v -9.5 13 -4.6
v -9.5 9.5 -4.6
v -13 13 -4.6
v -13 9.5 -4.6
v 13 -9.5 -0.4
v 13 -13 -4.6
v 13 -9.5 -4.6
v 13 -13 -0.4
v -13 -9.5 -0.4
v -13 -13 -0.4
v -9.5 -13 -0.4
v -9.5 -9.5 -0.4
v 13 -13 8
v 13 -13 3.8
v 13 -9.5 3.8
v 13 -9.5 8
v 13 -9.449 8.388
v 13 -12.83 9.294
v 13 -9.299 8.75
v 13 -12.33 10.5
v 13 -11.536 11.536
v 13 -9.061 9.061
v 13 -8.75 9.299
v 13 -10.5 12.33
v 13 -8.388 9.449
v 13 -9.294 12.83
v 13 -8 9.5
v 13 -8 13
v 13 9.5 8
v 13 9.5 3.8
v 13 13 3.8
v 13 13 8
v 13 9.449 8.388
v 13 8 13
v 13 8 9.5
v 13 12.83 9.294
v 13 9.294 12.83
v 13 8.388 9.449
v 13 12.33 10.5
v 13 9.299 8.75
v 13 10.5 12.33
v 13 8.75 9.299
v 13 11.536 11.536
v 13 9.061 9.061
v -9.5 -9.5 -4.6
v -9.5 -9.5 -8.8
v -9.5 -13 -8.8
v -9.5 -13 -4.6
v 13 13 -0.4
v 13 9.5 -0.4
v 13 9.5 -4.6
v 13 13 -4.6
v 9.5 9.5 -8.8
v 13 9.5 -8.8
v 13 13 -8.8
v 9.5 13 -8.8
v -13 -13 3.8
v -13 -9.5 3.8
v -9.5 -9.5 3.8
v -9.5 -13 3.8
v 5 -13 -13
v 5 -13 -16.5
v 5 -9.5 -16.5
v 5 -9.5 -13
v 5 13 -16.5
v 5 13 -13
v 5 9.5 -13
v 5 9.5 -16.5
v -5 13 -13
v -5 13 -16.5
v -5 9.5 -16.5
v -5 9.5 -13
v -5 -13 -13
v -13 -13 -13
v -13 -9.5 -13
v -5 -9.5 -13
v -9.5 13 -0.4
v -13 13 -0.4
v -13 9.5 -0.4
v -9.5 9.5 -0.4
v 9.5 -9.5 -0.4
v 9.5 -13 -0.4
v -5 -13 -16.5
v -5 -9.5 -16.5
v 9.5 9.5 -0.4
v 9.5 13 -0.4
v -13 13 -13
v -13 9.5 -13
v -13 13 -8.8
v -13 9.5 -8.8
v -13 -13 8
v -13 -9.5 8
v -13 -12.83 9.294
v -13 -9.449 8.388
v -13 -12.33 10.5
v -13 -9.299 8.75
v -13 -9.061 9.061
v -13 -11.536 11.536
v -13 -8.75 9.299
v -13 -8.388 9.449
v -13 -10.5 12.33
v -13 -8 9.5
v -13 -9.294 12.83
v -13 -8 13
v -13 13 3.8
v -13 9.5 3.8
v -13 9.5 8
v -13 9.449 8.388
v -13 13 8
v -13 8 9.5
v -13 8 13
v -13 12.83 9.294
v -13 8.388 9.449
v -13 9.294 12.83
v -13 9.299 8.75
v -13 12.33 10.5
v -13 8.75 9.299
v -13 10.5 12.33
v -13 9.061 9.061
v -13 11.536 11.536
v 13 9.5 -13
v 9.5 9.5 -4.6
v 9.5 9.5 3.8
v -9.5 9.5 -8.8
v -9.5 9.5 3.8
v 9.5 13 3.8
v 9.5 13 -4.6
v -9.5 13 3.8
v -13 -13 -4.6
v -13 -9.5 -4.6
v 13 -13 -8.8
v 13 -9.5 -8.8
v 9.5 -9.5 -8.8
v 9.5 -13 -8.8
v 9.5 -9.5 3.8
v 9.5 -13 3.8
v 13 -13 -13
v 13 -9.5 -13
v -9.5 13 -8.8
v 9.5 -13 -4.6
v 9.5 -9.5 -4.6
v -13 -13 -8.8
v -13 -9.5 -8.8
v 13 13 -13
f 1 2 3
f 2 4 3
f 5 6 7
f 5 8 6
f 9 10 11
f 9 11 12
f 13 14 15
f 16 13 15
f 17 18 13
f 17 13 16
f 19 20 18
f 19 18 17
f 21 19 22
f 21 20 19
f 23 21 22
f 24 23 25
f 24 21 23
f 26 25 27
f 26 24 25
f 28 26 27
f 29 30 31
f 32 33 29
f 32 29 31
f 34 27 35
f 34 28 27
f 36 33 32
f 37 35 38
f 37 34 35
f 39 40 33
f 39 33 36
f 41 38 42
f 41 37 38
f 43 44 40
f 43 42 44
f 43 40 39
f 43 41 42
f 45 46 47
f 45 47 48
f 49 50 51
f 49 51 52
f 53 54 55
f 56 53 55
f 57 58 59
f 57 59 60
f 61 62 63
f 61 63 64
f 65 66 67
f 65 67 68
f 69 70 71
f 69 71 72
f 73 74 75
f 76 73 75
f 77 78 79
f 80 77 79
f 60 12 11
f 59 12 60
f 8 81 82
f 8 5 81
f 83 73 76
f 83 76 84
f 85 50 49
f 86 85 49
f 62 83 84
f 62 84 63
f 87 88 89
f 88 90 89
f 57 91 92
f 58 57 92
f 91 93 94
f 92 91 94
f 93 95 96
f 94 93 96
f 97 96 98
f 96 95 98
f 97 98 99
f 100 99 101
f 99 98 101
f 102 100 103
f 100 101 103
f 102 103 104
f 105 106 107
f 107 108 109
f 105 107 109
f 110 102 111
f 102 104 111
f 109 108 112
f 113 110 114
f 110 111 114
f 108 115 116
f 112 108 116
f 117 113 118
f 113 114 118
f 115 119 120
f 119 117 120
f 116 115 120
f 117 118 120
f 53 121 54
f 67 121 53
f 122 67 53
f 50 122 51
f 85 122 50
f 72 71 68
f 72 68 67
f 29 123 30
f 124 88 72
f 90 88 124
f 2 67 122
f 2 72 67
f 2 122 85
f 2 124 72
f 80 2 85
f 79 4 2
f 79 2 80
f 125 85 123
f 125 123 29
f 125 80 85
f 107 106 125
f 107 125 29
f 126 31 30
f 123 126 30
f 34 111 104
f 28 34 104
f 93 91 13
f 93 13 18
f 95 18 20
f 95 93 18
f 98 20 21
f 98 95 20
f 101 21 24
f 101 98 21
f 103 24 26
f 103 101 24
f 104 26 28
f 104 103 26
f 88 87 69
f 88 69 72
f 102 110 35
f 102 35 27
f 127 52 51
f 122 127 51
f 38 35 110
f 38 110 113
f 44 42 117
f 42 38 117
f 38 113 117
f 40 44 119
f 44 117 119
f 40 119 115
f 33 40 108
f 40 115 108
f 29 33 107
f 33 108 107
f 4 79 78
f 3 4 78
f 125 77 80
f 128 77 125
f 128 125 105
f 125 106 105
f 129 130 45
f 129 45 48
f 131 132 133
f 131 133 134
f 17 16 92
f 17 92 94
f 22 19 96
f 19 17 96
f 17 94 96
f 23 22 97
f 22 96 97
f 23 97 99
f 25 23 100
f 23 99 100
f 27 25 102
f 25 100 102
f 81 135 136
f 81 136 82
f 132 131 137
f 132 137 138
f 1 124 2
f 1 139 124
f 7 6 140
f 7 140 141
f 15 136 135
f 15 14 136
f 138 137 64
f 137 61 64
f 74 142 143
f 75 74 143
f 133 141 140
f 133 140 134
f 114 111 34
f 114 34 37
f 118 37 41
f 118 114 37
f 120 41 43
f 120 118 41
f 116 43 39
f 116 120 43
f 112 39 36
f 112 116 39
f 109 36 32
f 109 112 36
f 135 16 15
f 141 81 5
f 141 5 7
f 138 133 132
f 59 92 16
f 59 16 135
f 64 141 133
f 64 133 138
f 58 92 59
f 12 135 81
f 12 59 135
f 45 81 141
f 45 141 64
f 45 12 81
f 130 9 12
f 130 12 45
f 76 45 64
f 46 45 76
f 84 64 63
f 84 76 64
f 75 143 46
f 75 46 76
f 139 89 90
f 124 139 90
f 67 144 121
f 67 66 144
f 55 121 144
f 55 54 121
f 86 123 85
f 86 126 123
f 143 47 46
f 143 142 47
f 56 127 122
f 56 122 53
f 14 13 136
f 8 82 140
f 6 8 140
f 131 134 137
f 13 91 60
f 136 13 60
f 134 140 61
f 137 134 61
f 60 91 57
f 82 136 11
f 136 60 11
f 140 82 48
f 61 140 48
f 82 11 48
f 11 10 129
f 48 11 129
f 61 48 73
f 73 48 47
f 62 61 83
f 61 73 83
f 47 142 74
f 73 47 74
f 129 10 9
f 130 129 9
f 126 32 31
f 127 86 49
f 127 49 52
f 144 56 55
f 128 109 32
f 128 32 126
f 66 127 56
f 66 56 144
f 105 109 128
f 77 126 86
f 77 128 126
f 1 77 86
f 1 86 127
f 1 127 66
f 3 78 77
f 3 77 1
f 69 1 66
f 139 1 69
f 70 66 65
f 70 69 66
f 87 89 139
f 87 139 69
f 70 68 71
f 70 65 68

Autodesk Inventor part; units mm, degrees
ref_plane "YZ Plane" through (0, 0, 0) normal (1, 0, 0) x (0, 1, 0)
ref_plane "XZ Plane" through (0, 0, 0) normal (0, 1, 0) x (-1, 0, 0)
sketch "Sketch1" plane through (0, 0, 0) normal (1, 0, 0) x (0, 1, 0)
  line L0 (13, 8) -> (13, -13)
  line L1 (5, -13) -> (0, -13)
  line L2 (0, -16.5) -> (5, -16.5)
  line L3 (5, -16.5) -> (5, -13)
  line L4 (0, 7.0803) -> (-6.4131, 0.6672)
  line L5 (-7.0965, 1.3506) -> (-0.3417, 8.1054)
  line L6 (-7.9849, 0.4622) -> (-7.0965, 1.3506) construction
  spline S0 degree 3 poles (-8.4777, -1.9692) (-8.4777, -0.714) (-7.9849, 0.4622) (-7.0965, 1.3506) knots 7 7 7 7 8 8 8 8
  line L7 (-8.4777, -1.9692) -> (-8.4777, -0.714) construction
  line L8 (-8.4777, -0.714) -> (-7.9849, 0.4622) construction
  line L9 (-6.4131, 0.6672) -> (-7.1181, -0.0378) construction
  spline S1 degree 3 poles (-6.4131, 0.6672) (-7.1181, -0.0378) (-7.5065, -0.9729) (-7.5065, -1.9692) (-7.5065, -2.9656) (-7.1217, -3.9007) (-6.4167, -4.6021) knots 2 2 2 2 3 3 3 4 4 4 4
  line L10 (-7.1181, -0.0378) -> (-7.5065, -0.9729) construction
  line L11 (-7.5065, -0.9729) -> (-7.5065, -1.9692) construction
  line L12 (-7.5065, -1.9692) -> (-7.5065, -2.9656) construction
  line L13 (-7.5065, -2.9656) -> (-7.1217, -3.9007) construction
  line L14 (-7.1217, -3.9007) -> (-6.4167, -4.6021) construction
  line L15 (-8.4813, -3.2245) -> (-8.4777, -1.9692) construction
  spline S2 degree 3 poles (-7.1037, -5.2927) (-7.9921, -4.4043) (-8.4813, -3.2245) (-8.4777, -1.9692) knots 6 6 6 6 7 7 7 7
  line L16 (-7.1037, -5.2927) -> (-7.9921, -4.4043) construction
  line L17 (-7.9921, -4.4043) -> (-8.4813, -3.2245) construction
  line L18 (-1.1474, -4.5985) -> (-0.3345, -3.7856)
  line L19 (-1.8524, -5.3035) -> (-1.1474, -4.5985) construction
  spline S3 degree 3 poles (-6.4167, -4.6021) (-5.7153, -5.3035) (-4.7802, -5.6919) (-3.7874, -5.6919) (-2.7911, -5.6919) (-1.8524, -5.3035) (-1.1474, -4.5985) knots 4 4 4 4 5 5 5 6 6 6 6
  line L20 (-6.4167, -4.6021) -> (-5.7153, -5.3035) construction
  line L21 (-5.7153, -5.3035) -> (-4.7802, -5.6919) construction
  line L22 (-4.7802, -5.6919) -> (-3.7874, -5.6919) construction
  line L23 (-3.7874, -5.6919) -> (-2.7911, -5.6919) construction
  line L24 (-2.7911, -5.6919) -> (-1.8524, -5.3035) construction
  line L25 (-0.4604, -5.2855) -> (-1.3488, -6.1739) construction
  spline S4 degree 3 poles (-0.4604, -5.2855) (-1.3488, -6.1739) (-2.5321, -6.6667) (-3.7874, -6.6667) (-5.0391, -6.6667) (-6.2189, -6.1775) (-7.1037, -5.2927) knots 4 4 4 4 5 5 5 6 6 6 6
  line L26 (-1.3488, -6.1739) -> (-2.5321, -6.6667) construction
  line L27 (-2.5321, -6.6667) -> (-3.7874, -6.6667) construction
  line L28 (-3.7874, -6.6667) -> (-5.0391, -6.6667) construction
  line L29 (-5.0391, -6.6667) -> (-6.2189, -6.1775) construction
  line L30 (-6.2189, -6.1775) -> (-7.1037, -5.2927) construction
  line L31 (2.5429, -6.6559) -> (1.3632, -6.1667) construction
  spline S5 degree 3 poles (7.1181, -5.2819) (6.2297, -6.1703) (5.0535, -6.6559) (3.7982, -6.6559) (2.5429, -6.6559) (1.3632, -6.1667) (0.4748, -5.2783) knots 0 0 0 0 1 1 1 2 2 2 2
  line L32 (7.1181, -5.2819) -> (6.2297, -6.1703) construction
  line L33 (6.2297, -6.1703) -> (5.0535, -6.6559) construction
  line L34 (5.0535, -6.6559) -> (3.7982, -6.6559) construction
  line L35 (3.7982, -6.6559) -> (2.5429, -6.6559) construction
  line L36 (1.3632, -6.1667) -> (0.4748, -5.2783) construction
  spline S6 degree 3 poles (-0.3345, -3.7856) (-0.1439, -3.595) (0.1619, -3.595) (0.3525, -3.7856) knots 7 7 7 7 8 8 8 8
  line L37 (-0.1439, -3.595) -> (0.1619, -3.595) construction
  line L38 (-0.3345, -3.7856) -> (-0.1439, -3.595) construction
  line L39 (0.1619, -3.595) -> (0.3525, -3.7856) construction
  line L40 (0.0108, -4.8143) -> (-0.4604, -5.2855)
  line L41 (0.4748, -5.2783) -> (0.0108, -4.8143)
  line L42 (6.4275, 0.678) -> (0, 7.0803)
  line L43 (-0.3417, 8.1054) -> (-0.2482, 8.1989) construction
  spline S7 degree 3 poles (-0.3417, 8.1054) (-0.2482, 8.1989) (-0.1223, 8.2493) (0, 8.2493) (0.1223, 8.2493) (0.2482, 8.2025) (0.3417, 8.109) knots 9 9 9 9 10 10 10 11 11 11 11
  line L44 (-0.2482, 8.1989) -> (-0.1223, 8.2493) construction
  line L45 (-0.1223, 8.2493) -> (0, 8.2493) construction
  line L46 (0, 8.2493) -> (0.1223, 8.2493) construction
  line L47 (0.1223, 8.2493) -> (0.2482, 8.2025) construction
  line L48 (0.2482, 8.2025) -> (0.3417, 8.109) construction
  line L49 (0.3417, 8.109) -> (7.1109, 1.365)
  line L50 (0.3525, -3.7856) -> (1.1582, -4.5913)
  spline S8 degree 3 poles (1.1582, -4.5913) (1.8631, -5.2963) (2.8019, -5.6847) (3.7946, -5.6847) (4.7873, -5.6847) (5.7225, -5.2963) (6.4275, -4.5949) knots 9 9 9 9 10 10 10 11 11 11 11
  line L51 (1.1582, -4.5913) -> (1.8631, -5.2963) construction
  line L52 (1.8631, -5.2963) -> (2.8019, -5.6847) construction
  line L53 (2.8019, -5.6847) -> (3.7946, -5.6847) construction
  line L54 (3.7946, -5.6847) -> (4.7873, -5.6847) construction
  line L55 (4.7873, -5.6847) -> (5.7225, -5.2963) construction
  line L56 (5.7225, -5.2963) -> (6.4275, -4.5949) construction
  line L57 (6.4275, -4.5949) -> (7.1325, -3.8899) construction
  spline S9 degree 3 poles (6.4275, -4.5949) (7.1325, -3.8899) (7.5173, -2.9548) (7.5173, -1.9584) knots 11 11 11 11 12 12 12 12
  line L58 (7.1325, -3.8899) -> (7.5173, -2.9548) construction
  line L59 (7.5173, -2.9548) -> (7.5173, -1.9584) construction
  line L60 (8.0065, -4.3935) -> (7.1181, -5.2819) construction
  spline S10 degree 3 poles (8.4885, -1.9584) (8.4921, -3.2137) (8.0065, -4.3935) (7.1181, -5.2819) knots 13 13 13 13 14 14 14 14
  line L61 (8.4885, -1.9584) -> (8.4921, -3.2137) construction
  line L62 (8.4921, -3.2137) -> (8.0065, -4.3935) construction
  line L63 (7.5173, -1.9584) -> (7.5209, -0.9621) construction
  spline S11 degree 3 poles (7.5173, -1.9584) (7.5209, -0.9621) (7.1325, -0.027) (6.4275, 0.678) knots 12 12 12 12 13 13 13 13
  line L64 (7.5209, -0.9621) -> (7.1325, -0.027) construction
  line L65 (7.1325, -0.027) -> (6.4275, 0.678) construction
  line L66 (8.4885, -0.7032) -> (8.4885, -1.9584) construction
  spline S12 degree 3 poles (7.1109, 1.365) (7.9993, 0.4766) (8.4885, -0.7032) (8.4885, -1.9584) knots 12 12 12 12 13 13 13 13
  line L67 (7.1109, 1.365) -> (7.9993, 0.4766) construction
  line L68 (7.9993, 0.4766) -> (8.4885, -0.7032) construction
  arc A0 (13, 8) -> (8, 13) centre (8, 8) ccw
  line L69 (0, -16.5) -> (0, -13)
  line L70 (13, -13) -> (0, -13)
  line L71 (8, 13) -> (0, 13)
  line L72 (-8, 13) -> (0, 13)
  arc A1 (-8, 13) -> (-13, 8) centre (-8, 8) ccw
  line L73 (-5, -13) -> (0, -13)
  line L74 (-5, -16.5) -> (-5, -13)
  line L75 (0, -16.5) -> (-5, -16.5)
  line L76 (-13, -13) -> (0, -13)
  line L77 (-13, 8) -> (-13, -13)
  line L78 (13, -4.6) -> (16.5, -4.6)
  line L79 (16.5, -4.6) -> (16.5, -8.8)
  line L80 (16.5, -8.8) -> (13, -8.8)
  line L81 (13, -8.8) -> (13, -4.6)
  line L82 (16.5, -0.4) -> (13, -0.4)
  line L83 (16.5, 3.8) -> (16.5, -0.4)
  line L84 (13, 3.8) -> (16.5, 3.8)
  line L85 (-16.5, 3.8) -> (-16.5, -0.4)
  line L86 (-13, 3.8) -> (-16.5, 3.8)
  line L87 (-16.5, -0.4) -> (-13, -0.4)
  line L88 (-13, -4.6) -> (-16.5, -4.6)
  line L89 (-16.5, -8.8) -> (-13, -8.8)
  line L90 (-16.5, -4.6) -> (-16.5, -8.8)
  line L91 (9.5, -9.5) -> (9.5, 8)
  arc A2 (9.5, 8) -> (8, 9.5) centre (8, 8) ccw
  line L92 (8, 9.5) -> (0, 9.5)
  line L93 (0, 9.5) -> (-8, 9.5)
  arc A3 (-8, 9.5) -> (-9.5, 8) centre (-8, 8) ccw
  line L94 (-9.5, 8) -> (-9.5, -9.5)
  line L95 (-9.5, -9.5) -> (0, -9.5)
  line L96 (0, -9.5) -> (9.5, -9.5)
  line L97 (9.5, -9.5) -> (9.5, -13)
  line L98 (-9.5, -9.5) -> (-9.5, -13)
  line L99 (13, -8.8) -> (9.5, -8.8)
  line L100 (9.5, -8.8) -> (9.5, -4.6)
  line L101 (9.5, -4.6) -> (13, -4.6)
  line L102 (13, -4.6) -> (13, -8.8)
  line L103 (13, -0.4) -> (9.5, -0.4)
  line L104 (9.5, -0.4) -> (9.5, 3.8)
  line L105 (9.5, 3.8) -> (13, 3.8)
  line L106 (13, 3.8) -> (13, -0.4)
  line L107 (-13, 3.8) -> (-9.5, 3.8)
  line L108 (-9.5, 3.8) -> (-9.5, -0.4)
  line L109 (-9.5, -0.4) -> (-13, -0.4)
  line L110 (-13, -0.4) -> (-13, 3.8)
  line L111 (-13, -4.6) -> (-9.5, -4.6)
  line L112 (-9.5, -4.6) -> (-9.5, -8.8)
  line L113 (-9.5, -8.8) -> (-13, -8.8)
  line L114 (-13, -8.8) -> (-13, -4.6)
  line L115 (0.3, 6.198) -> (-0.3, 6.198)
  line L116 (-0.3, 6.198) -> (-0.3, 9.1381)
  line L117 (-0.3, 9.1381) -> (0.3, 9.1381)
  line L118 (0.3, 9.1381) -> (0.3, 6.198)
  line L119 (-8.0638, -4.3092) -> (-5.5177, -2.8392)
  line L120 (-7.7638, -4.8289) -> (-8.0638, -4.3092)
  line L121 (-5.2177, -3.3588) -> (-7.7638, -4.8289)
  line L122 (-5.5177, -2.8392) -> (-5.2177, -3.3588)
  line L123 (7.7638, -4.8289) -> (5.2177, -3.3588)
  line L124 (8.0638, -4.3092) -> (7.7638, -4.8289)
  line L125 (5.5177, -2.8392) -> (8.0638, -4.3092)
  line L126 (5.2177, -3.3588) -> (5.5177, -2.8392)
  point P0 (0.3, 11.1366)
  point P1 (0.4643, 11.0177)
  point P2 (9.6684, 1.8477)
  point P3 (11.5332, -2.6643)
  point P4 (10.7976, -5.6567)
  point P5 (9.6497, -4.9939)
  point P6 (10.2137, -2.6609)
  point P7 (8.7384, 0.9158)
  point P8 (0.5, 9.122)
  point P9 (10.2596, -6.5007)
  point P10 (9.6713, -7.1765)
  point P11 (0.6451, -7.1716)
  point P12 (0.0147, -6.5412)
  point P13 (-0.6255, -7.1814)
  point P14 (-9.6517, -7.1911)
  point P15 (-10.2539, -6.4975)
  point P16 (-9.2214, -5.6704)
  point P17 (-8.7205, -6.2507)
  point P18 (-1.5589, -6.248)
  point P19 (-0.4542, -5.1432)
  point P20 (0.4789, -5.1435)
  point P21 (1.5736, -6.2382)
  point P22 (8.733, -6.2431)
  point P23 (9.102, -5.8324)
  point P24 (-0.3, 11.1333)
  point P25 (-0.5, 9.12)
  point P26 (-8.7136, 0.9064)
  point P27 (-9.5487, -5.1665)
  point P28 (-10.7898, -5.6522)
  point P29 (-11.5186, -2.6721)
  point P30 (-9.642, 1.8351)
  point P31 (-0.4643, 11.0128)
  point P32 (8.733, 0.9212)
  point P33 (11.5332, -2.6609)
  point P34 (9.6615, 1.8546)
  point P35 (0.5, 10.9821)
  point P36 (-0.4545, -5.1435)
  point P37 (-8.7183, -6.2528)
  point P38 (-9.0983, -5.8302)
  point P39 (-9.6438, -4.9905)
  point P40 (-11.5186, -2.6756)
  point P41 (-8.7134, 0.9066)
  point P42 (-0.5, 10.977)
  point P43 (0, 0)
  point P44 (13, 13)
  point P45 (-13, 0)
  point P46 (0, 6.5628)
  point P47 (-13, 13)
  point P48 (-5, -14.75)
  point P49 (7.1159, 1.3599)
  point P50 (8.4885, -1.9609)
  point P51 (6.4315, 0.674)
  point P52 (7.1181, -5.2819)
  point P53 (-6.4183, -4.6005)
  point P54 (-0.3345, -3.7856)
  point P55 (1.1582, -4.5913)
  point P56 (-6.4131, 0.6672)
  point P57 (-8.4777, -1.9667)
  point P58 (-0.3417, 8.1054)
  point P59 (8.733, 0.9212)
  point P60 (11.5332, -2.6609)
  point P61 (9.6615, 1.8546)
  point P62 (-0.4545, -5.1435)
  point P63 (-8.7183, -6.2528)
  point P64 (-11.5186, -2.6756)
  point P65 (-8.7134, 0.9066)
  point P66 (0, 6.198)
  point P67 (-5.3677, -3.099)
  point P68 (5.3677, -3.099)
  point P69 (0.3, 8.1463)
  point P70 (7.1109, 1.365)
  point P71 (7.9147, -4.2232)
  point P72 (7.0703, -3.7356)
  point P73 (0.3, 6.7815)
  point P74 (7.5919, -4.7296)
  point P75 (-7.5876, -4.7271)
  point P76 (-6.7441, -4.2401)
  point P77 (-0.3345, -3.7856)
  point P78 (6.7417, -4.2387)
  point P79 (-0.3, 8.1429)
  point P80 (-0.3, 6.7803)
  point P81 (-7.0683, -3.7345)
  point P82 (-7.9091, -4.2199)
  point P83 (-8.4777, -1.9692)
  dimension "d50" = 26
  dimension "d51" = 5
  dimension "d52" = 10
  dimension "d53" = 13
  dimension "d54" = 4.2
  dimension "d55" = 3.5
  dimension "d56" = 4.2
  dimension "d57" = 8.4
  dimension "d58" = 3.5
  dimension "d59" = 0.6
  dimension "d60" = 360
extrude "Extrusion1" add sketch "Sketch1" along normal mid plane 26 contours L0 L105 L91 A2 L92 L93 A3 L94 L107 L77 A1 L72 L71 A0 | L0 L103 L91 L105 | L0 L101 L91 L103 | L0 L99 L91 L101 | L0 L70 L97 L91 L99 | L107 L94 L109 L77 | L109 L94 L111 L77 | L111 L94 L113 L77 | L98 L76 L77 L113 L94
sketch "Sketch4" plane through (13, 0, 0) normal (1, 0, 0) x (0, 0, -1)
  line L0 (13, 8) -> (13, -13)
  line L1 (13, -4.6) -> (16.5, -4.6)
  line L2 (16.5, -4.6) -> (16.5, -8.8)
  line L3 (16.5, -8.8) -> (13, -8.8)
  line L4 (16.5, -0.4) -> (13, -0.4)
  line L5 (16.5, 3.8) -> (16.5, -0.4)
  line L6 (13, 3.8) -> (16.5, 3.8)
  line L7 (-0.3, 9.1381) -> (0.3, 9.1381)
  line L8 (-8, 9.5) -> (13, 9.5) projected
  line L9 (8.8, 13.0373) -> (4.6, 13.0373)
  line L10 (4.6, 13.0373) -> (4.6, 9.5)
  line L11 (4.6, 9.5) -> (8.8, 9.5)
  line L12 (8.8, 9.5) -> (8.8, 13.0373)
  line L13 (13, 9.5) -> (13, 13) projected
  line L14 (-3.8, 13.0373) -> (-3.8, 9.5)
  line L15 (0.4, 13.0373) -> (-3.8, 13.0373)
  line L16 (0.4, 9.5) -> (0.4, 13.0373)
  line L17 (-3.8, 9.5) -> (0.4, 9.5)
  line L18 (0, 0) -> (1.8362, 0)
  line L19 (-8, -9.5) -> (13, -9.5)
  line L20 (8.8, -13.0373) -> (4.6, -13.0373)
  line L21 (4.6, -13.0373) -> (4.6, -9.5)
  line L22 (8.8, -9.5) -> (8.8, -13.0373)
  line L23 (-3.8, -13.0373) -> (-3.8, -9.5)
  line L24 (0.4, -13.0373) -> (-3.8, -13.0373)
  line L25 (0.4, -9.5) -> (0.4, -13.0373)
  line L26 (-3.8, -9.5) -> (0.4, -9.5)
  point P0 (0.3417, 8.109)
  point P1 (7.1159, 1.3599)
  point P2 (8.4885, -1.9609)
  point P3 (7.5173, -1.9584)
  point P4 (6.4315, 0.674)
  point P5 (7.1181, -5.2819)
  point P6 (0.4748, -5.2783)
  point P7 (0.0108, -4.8143)
  point P8 (-0.4604, -5.2855)
  point P9 (-7.1037, -5.2927)
  point P10 (-6.4183, -4.6005)
  point P11 (-1.1474, -4.5985)
  point P12 (-0.3345, -3.7856)
  point P13 (0.3525, -3.7856)
  point P14 (1.1582, -4.5913)
  point P15 (6.4275, -4.5949)
  point P16 (-6.4131, 0.6672)
  point P17 (-8.4777, -1.9667)
  point P18 (-7.0965, 1.3506)
  point P19 (-0.3417, 8.1054)
  point P20 (8.733, 0.9212)
  point P21 (11.5332, -2.6609)
  point P22 (9.6615, 1.8546)
  point P23 (-0.4545, -5.1435)
  point P24 (-8.7183, -6.2528)
  point P25 (-11.5186, -2.6756)
  point P26 (-8.7134, 0.9066)
  point P27 (-13, -8.8)
  point P28 (-13, -4.6)
  point P29 (-13, -0.4)
  point P30 (-13, 3.8)
  point P31 (0.3, 8.1463)
  point P32 (7.1109, 1.365)
  point P33 (8.4885, -1.9584)
  point P34 (7.9147, -4.2232)
  point P35 (7.0703, -3.7356)
  point P36 (6.4275, 0.678)
  point P37 (0.3, 6.7815)
  point P38 (7.5919, -4.7296)
  point P39 (-7.5876, -4.7271)
  point P40 (-6.7441, -4.2401)
  point P41 (-6.4167, -4.6021)
  point P42 (-0.3345, -3.7856)
  point P43 (6.7417, -4.2387)
  point P44 (-9.5, 3.8)
  point P45 (-13, 3.8)
  point P46 (-13, -0.4)
  point P47 (-9.5, -4.6)
  point P48 (-13, -4.6)
  point P49 (-13, -8.8)
  point P50 (9.5, -8.8)
  point P51 (9.5, -0.4)
  point P52 (-0.3, 8.1429)
  point P53 (-0.3, 6.7803)
  point P54 (-7.0683, -3.7345)
  point P55 (-7.9091, -4.2199)
  point P56 (-8.4777, -1.9692)
  dimension "d75" = 8.4
  dimension "d80" = 4.2
  dimension "d81" = 4.2
  dimension "d84" = 8.4
extrude "Extrusion4" cut sketch "Sketch4" against normal blind 3.5 contours L25 L24 L23 L19 | L22 L20 L21 L19 | L14 L15 L16 L8 | L10 L9 L12 L8
mirror "Mirror3" about plane through (0, 0, 0) normal (1, 0, 0) of "Extrusion4"
sketch "Sketch5" plane through (-13, 13, 8) normal (0, 1, 0) x (1, 0, 0)
  line L0 (0, 21) -> (26, 21) projected
  line L1 (8, 21) -> (18, 21)
  line L2 (18, 21) -> (18, 24.5)
  line L3 (18, 24.5) -> (8, 24.5)
  line L4 (8, 24.5) -> (8, 21)
  point P0 (13, 8)
  point P1 (13, 24.5)
  dimension "d91" = 10
  dimension "d92" = 3.5
extrude "Extrusion5" add sketch "Sketch5" against normal up to surface (3.5 mm away)
ref_plane "Work Plane2" through (13, 0, 9.5) normal (0, -1, 0) x (1, 0, 0)
mirror "Mirror4" about plane through (13, 0, 9.5) normal (0, -1, 0) of "Extrusion5"
equation "\"d56\" = d54"
equation "\"d57\" = 2 * d54"
equation "\"d75\" = 2 * d72"
equation "\"d81\" = d80"
equation "\"d84\" = 2 * d80"
equation "\"d72\" = 4.2"
properties part number "Spodnji del - Upognjen les"
